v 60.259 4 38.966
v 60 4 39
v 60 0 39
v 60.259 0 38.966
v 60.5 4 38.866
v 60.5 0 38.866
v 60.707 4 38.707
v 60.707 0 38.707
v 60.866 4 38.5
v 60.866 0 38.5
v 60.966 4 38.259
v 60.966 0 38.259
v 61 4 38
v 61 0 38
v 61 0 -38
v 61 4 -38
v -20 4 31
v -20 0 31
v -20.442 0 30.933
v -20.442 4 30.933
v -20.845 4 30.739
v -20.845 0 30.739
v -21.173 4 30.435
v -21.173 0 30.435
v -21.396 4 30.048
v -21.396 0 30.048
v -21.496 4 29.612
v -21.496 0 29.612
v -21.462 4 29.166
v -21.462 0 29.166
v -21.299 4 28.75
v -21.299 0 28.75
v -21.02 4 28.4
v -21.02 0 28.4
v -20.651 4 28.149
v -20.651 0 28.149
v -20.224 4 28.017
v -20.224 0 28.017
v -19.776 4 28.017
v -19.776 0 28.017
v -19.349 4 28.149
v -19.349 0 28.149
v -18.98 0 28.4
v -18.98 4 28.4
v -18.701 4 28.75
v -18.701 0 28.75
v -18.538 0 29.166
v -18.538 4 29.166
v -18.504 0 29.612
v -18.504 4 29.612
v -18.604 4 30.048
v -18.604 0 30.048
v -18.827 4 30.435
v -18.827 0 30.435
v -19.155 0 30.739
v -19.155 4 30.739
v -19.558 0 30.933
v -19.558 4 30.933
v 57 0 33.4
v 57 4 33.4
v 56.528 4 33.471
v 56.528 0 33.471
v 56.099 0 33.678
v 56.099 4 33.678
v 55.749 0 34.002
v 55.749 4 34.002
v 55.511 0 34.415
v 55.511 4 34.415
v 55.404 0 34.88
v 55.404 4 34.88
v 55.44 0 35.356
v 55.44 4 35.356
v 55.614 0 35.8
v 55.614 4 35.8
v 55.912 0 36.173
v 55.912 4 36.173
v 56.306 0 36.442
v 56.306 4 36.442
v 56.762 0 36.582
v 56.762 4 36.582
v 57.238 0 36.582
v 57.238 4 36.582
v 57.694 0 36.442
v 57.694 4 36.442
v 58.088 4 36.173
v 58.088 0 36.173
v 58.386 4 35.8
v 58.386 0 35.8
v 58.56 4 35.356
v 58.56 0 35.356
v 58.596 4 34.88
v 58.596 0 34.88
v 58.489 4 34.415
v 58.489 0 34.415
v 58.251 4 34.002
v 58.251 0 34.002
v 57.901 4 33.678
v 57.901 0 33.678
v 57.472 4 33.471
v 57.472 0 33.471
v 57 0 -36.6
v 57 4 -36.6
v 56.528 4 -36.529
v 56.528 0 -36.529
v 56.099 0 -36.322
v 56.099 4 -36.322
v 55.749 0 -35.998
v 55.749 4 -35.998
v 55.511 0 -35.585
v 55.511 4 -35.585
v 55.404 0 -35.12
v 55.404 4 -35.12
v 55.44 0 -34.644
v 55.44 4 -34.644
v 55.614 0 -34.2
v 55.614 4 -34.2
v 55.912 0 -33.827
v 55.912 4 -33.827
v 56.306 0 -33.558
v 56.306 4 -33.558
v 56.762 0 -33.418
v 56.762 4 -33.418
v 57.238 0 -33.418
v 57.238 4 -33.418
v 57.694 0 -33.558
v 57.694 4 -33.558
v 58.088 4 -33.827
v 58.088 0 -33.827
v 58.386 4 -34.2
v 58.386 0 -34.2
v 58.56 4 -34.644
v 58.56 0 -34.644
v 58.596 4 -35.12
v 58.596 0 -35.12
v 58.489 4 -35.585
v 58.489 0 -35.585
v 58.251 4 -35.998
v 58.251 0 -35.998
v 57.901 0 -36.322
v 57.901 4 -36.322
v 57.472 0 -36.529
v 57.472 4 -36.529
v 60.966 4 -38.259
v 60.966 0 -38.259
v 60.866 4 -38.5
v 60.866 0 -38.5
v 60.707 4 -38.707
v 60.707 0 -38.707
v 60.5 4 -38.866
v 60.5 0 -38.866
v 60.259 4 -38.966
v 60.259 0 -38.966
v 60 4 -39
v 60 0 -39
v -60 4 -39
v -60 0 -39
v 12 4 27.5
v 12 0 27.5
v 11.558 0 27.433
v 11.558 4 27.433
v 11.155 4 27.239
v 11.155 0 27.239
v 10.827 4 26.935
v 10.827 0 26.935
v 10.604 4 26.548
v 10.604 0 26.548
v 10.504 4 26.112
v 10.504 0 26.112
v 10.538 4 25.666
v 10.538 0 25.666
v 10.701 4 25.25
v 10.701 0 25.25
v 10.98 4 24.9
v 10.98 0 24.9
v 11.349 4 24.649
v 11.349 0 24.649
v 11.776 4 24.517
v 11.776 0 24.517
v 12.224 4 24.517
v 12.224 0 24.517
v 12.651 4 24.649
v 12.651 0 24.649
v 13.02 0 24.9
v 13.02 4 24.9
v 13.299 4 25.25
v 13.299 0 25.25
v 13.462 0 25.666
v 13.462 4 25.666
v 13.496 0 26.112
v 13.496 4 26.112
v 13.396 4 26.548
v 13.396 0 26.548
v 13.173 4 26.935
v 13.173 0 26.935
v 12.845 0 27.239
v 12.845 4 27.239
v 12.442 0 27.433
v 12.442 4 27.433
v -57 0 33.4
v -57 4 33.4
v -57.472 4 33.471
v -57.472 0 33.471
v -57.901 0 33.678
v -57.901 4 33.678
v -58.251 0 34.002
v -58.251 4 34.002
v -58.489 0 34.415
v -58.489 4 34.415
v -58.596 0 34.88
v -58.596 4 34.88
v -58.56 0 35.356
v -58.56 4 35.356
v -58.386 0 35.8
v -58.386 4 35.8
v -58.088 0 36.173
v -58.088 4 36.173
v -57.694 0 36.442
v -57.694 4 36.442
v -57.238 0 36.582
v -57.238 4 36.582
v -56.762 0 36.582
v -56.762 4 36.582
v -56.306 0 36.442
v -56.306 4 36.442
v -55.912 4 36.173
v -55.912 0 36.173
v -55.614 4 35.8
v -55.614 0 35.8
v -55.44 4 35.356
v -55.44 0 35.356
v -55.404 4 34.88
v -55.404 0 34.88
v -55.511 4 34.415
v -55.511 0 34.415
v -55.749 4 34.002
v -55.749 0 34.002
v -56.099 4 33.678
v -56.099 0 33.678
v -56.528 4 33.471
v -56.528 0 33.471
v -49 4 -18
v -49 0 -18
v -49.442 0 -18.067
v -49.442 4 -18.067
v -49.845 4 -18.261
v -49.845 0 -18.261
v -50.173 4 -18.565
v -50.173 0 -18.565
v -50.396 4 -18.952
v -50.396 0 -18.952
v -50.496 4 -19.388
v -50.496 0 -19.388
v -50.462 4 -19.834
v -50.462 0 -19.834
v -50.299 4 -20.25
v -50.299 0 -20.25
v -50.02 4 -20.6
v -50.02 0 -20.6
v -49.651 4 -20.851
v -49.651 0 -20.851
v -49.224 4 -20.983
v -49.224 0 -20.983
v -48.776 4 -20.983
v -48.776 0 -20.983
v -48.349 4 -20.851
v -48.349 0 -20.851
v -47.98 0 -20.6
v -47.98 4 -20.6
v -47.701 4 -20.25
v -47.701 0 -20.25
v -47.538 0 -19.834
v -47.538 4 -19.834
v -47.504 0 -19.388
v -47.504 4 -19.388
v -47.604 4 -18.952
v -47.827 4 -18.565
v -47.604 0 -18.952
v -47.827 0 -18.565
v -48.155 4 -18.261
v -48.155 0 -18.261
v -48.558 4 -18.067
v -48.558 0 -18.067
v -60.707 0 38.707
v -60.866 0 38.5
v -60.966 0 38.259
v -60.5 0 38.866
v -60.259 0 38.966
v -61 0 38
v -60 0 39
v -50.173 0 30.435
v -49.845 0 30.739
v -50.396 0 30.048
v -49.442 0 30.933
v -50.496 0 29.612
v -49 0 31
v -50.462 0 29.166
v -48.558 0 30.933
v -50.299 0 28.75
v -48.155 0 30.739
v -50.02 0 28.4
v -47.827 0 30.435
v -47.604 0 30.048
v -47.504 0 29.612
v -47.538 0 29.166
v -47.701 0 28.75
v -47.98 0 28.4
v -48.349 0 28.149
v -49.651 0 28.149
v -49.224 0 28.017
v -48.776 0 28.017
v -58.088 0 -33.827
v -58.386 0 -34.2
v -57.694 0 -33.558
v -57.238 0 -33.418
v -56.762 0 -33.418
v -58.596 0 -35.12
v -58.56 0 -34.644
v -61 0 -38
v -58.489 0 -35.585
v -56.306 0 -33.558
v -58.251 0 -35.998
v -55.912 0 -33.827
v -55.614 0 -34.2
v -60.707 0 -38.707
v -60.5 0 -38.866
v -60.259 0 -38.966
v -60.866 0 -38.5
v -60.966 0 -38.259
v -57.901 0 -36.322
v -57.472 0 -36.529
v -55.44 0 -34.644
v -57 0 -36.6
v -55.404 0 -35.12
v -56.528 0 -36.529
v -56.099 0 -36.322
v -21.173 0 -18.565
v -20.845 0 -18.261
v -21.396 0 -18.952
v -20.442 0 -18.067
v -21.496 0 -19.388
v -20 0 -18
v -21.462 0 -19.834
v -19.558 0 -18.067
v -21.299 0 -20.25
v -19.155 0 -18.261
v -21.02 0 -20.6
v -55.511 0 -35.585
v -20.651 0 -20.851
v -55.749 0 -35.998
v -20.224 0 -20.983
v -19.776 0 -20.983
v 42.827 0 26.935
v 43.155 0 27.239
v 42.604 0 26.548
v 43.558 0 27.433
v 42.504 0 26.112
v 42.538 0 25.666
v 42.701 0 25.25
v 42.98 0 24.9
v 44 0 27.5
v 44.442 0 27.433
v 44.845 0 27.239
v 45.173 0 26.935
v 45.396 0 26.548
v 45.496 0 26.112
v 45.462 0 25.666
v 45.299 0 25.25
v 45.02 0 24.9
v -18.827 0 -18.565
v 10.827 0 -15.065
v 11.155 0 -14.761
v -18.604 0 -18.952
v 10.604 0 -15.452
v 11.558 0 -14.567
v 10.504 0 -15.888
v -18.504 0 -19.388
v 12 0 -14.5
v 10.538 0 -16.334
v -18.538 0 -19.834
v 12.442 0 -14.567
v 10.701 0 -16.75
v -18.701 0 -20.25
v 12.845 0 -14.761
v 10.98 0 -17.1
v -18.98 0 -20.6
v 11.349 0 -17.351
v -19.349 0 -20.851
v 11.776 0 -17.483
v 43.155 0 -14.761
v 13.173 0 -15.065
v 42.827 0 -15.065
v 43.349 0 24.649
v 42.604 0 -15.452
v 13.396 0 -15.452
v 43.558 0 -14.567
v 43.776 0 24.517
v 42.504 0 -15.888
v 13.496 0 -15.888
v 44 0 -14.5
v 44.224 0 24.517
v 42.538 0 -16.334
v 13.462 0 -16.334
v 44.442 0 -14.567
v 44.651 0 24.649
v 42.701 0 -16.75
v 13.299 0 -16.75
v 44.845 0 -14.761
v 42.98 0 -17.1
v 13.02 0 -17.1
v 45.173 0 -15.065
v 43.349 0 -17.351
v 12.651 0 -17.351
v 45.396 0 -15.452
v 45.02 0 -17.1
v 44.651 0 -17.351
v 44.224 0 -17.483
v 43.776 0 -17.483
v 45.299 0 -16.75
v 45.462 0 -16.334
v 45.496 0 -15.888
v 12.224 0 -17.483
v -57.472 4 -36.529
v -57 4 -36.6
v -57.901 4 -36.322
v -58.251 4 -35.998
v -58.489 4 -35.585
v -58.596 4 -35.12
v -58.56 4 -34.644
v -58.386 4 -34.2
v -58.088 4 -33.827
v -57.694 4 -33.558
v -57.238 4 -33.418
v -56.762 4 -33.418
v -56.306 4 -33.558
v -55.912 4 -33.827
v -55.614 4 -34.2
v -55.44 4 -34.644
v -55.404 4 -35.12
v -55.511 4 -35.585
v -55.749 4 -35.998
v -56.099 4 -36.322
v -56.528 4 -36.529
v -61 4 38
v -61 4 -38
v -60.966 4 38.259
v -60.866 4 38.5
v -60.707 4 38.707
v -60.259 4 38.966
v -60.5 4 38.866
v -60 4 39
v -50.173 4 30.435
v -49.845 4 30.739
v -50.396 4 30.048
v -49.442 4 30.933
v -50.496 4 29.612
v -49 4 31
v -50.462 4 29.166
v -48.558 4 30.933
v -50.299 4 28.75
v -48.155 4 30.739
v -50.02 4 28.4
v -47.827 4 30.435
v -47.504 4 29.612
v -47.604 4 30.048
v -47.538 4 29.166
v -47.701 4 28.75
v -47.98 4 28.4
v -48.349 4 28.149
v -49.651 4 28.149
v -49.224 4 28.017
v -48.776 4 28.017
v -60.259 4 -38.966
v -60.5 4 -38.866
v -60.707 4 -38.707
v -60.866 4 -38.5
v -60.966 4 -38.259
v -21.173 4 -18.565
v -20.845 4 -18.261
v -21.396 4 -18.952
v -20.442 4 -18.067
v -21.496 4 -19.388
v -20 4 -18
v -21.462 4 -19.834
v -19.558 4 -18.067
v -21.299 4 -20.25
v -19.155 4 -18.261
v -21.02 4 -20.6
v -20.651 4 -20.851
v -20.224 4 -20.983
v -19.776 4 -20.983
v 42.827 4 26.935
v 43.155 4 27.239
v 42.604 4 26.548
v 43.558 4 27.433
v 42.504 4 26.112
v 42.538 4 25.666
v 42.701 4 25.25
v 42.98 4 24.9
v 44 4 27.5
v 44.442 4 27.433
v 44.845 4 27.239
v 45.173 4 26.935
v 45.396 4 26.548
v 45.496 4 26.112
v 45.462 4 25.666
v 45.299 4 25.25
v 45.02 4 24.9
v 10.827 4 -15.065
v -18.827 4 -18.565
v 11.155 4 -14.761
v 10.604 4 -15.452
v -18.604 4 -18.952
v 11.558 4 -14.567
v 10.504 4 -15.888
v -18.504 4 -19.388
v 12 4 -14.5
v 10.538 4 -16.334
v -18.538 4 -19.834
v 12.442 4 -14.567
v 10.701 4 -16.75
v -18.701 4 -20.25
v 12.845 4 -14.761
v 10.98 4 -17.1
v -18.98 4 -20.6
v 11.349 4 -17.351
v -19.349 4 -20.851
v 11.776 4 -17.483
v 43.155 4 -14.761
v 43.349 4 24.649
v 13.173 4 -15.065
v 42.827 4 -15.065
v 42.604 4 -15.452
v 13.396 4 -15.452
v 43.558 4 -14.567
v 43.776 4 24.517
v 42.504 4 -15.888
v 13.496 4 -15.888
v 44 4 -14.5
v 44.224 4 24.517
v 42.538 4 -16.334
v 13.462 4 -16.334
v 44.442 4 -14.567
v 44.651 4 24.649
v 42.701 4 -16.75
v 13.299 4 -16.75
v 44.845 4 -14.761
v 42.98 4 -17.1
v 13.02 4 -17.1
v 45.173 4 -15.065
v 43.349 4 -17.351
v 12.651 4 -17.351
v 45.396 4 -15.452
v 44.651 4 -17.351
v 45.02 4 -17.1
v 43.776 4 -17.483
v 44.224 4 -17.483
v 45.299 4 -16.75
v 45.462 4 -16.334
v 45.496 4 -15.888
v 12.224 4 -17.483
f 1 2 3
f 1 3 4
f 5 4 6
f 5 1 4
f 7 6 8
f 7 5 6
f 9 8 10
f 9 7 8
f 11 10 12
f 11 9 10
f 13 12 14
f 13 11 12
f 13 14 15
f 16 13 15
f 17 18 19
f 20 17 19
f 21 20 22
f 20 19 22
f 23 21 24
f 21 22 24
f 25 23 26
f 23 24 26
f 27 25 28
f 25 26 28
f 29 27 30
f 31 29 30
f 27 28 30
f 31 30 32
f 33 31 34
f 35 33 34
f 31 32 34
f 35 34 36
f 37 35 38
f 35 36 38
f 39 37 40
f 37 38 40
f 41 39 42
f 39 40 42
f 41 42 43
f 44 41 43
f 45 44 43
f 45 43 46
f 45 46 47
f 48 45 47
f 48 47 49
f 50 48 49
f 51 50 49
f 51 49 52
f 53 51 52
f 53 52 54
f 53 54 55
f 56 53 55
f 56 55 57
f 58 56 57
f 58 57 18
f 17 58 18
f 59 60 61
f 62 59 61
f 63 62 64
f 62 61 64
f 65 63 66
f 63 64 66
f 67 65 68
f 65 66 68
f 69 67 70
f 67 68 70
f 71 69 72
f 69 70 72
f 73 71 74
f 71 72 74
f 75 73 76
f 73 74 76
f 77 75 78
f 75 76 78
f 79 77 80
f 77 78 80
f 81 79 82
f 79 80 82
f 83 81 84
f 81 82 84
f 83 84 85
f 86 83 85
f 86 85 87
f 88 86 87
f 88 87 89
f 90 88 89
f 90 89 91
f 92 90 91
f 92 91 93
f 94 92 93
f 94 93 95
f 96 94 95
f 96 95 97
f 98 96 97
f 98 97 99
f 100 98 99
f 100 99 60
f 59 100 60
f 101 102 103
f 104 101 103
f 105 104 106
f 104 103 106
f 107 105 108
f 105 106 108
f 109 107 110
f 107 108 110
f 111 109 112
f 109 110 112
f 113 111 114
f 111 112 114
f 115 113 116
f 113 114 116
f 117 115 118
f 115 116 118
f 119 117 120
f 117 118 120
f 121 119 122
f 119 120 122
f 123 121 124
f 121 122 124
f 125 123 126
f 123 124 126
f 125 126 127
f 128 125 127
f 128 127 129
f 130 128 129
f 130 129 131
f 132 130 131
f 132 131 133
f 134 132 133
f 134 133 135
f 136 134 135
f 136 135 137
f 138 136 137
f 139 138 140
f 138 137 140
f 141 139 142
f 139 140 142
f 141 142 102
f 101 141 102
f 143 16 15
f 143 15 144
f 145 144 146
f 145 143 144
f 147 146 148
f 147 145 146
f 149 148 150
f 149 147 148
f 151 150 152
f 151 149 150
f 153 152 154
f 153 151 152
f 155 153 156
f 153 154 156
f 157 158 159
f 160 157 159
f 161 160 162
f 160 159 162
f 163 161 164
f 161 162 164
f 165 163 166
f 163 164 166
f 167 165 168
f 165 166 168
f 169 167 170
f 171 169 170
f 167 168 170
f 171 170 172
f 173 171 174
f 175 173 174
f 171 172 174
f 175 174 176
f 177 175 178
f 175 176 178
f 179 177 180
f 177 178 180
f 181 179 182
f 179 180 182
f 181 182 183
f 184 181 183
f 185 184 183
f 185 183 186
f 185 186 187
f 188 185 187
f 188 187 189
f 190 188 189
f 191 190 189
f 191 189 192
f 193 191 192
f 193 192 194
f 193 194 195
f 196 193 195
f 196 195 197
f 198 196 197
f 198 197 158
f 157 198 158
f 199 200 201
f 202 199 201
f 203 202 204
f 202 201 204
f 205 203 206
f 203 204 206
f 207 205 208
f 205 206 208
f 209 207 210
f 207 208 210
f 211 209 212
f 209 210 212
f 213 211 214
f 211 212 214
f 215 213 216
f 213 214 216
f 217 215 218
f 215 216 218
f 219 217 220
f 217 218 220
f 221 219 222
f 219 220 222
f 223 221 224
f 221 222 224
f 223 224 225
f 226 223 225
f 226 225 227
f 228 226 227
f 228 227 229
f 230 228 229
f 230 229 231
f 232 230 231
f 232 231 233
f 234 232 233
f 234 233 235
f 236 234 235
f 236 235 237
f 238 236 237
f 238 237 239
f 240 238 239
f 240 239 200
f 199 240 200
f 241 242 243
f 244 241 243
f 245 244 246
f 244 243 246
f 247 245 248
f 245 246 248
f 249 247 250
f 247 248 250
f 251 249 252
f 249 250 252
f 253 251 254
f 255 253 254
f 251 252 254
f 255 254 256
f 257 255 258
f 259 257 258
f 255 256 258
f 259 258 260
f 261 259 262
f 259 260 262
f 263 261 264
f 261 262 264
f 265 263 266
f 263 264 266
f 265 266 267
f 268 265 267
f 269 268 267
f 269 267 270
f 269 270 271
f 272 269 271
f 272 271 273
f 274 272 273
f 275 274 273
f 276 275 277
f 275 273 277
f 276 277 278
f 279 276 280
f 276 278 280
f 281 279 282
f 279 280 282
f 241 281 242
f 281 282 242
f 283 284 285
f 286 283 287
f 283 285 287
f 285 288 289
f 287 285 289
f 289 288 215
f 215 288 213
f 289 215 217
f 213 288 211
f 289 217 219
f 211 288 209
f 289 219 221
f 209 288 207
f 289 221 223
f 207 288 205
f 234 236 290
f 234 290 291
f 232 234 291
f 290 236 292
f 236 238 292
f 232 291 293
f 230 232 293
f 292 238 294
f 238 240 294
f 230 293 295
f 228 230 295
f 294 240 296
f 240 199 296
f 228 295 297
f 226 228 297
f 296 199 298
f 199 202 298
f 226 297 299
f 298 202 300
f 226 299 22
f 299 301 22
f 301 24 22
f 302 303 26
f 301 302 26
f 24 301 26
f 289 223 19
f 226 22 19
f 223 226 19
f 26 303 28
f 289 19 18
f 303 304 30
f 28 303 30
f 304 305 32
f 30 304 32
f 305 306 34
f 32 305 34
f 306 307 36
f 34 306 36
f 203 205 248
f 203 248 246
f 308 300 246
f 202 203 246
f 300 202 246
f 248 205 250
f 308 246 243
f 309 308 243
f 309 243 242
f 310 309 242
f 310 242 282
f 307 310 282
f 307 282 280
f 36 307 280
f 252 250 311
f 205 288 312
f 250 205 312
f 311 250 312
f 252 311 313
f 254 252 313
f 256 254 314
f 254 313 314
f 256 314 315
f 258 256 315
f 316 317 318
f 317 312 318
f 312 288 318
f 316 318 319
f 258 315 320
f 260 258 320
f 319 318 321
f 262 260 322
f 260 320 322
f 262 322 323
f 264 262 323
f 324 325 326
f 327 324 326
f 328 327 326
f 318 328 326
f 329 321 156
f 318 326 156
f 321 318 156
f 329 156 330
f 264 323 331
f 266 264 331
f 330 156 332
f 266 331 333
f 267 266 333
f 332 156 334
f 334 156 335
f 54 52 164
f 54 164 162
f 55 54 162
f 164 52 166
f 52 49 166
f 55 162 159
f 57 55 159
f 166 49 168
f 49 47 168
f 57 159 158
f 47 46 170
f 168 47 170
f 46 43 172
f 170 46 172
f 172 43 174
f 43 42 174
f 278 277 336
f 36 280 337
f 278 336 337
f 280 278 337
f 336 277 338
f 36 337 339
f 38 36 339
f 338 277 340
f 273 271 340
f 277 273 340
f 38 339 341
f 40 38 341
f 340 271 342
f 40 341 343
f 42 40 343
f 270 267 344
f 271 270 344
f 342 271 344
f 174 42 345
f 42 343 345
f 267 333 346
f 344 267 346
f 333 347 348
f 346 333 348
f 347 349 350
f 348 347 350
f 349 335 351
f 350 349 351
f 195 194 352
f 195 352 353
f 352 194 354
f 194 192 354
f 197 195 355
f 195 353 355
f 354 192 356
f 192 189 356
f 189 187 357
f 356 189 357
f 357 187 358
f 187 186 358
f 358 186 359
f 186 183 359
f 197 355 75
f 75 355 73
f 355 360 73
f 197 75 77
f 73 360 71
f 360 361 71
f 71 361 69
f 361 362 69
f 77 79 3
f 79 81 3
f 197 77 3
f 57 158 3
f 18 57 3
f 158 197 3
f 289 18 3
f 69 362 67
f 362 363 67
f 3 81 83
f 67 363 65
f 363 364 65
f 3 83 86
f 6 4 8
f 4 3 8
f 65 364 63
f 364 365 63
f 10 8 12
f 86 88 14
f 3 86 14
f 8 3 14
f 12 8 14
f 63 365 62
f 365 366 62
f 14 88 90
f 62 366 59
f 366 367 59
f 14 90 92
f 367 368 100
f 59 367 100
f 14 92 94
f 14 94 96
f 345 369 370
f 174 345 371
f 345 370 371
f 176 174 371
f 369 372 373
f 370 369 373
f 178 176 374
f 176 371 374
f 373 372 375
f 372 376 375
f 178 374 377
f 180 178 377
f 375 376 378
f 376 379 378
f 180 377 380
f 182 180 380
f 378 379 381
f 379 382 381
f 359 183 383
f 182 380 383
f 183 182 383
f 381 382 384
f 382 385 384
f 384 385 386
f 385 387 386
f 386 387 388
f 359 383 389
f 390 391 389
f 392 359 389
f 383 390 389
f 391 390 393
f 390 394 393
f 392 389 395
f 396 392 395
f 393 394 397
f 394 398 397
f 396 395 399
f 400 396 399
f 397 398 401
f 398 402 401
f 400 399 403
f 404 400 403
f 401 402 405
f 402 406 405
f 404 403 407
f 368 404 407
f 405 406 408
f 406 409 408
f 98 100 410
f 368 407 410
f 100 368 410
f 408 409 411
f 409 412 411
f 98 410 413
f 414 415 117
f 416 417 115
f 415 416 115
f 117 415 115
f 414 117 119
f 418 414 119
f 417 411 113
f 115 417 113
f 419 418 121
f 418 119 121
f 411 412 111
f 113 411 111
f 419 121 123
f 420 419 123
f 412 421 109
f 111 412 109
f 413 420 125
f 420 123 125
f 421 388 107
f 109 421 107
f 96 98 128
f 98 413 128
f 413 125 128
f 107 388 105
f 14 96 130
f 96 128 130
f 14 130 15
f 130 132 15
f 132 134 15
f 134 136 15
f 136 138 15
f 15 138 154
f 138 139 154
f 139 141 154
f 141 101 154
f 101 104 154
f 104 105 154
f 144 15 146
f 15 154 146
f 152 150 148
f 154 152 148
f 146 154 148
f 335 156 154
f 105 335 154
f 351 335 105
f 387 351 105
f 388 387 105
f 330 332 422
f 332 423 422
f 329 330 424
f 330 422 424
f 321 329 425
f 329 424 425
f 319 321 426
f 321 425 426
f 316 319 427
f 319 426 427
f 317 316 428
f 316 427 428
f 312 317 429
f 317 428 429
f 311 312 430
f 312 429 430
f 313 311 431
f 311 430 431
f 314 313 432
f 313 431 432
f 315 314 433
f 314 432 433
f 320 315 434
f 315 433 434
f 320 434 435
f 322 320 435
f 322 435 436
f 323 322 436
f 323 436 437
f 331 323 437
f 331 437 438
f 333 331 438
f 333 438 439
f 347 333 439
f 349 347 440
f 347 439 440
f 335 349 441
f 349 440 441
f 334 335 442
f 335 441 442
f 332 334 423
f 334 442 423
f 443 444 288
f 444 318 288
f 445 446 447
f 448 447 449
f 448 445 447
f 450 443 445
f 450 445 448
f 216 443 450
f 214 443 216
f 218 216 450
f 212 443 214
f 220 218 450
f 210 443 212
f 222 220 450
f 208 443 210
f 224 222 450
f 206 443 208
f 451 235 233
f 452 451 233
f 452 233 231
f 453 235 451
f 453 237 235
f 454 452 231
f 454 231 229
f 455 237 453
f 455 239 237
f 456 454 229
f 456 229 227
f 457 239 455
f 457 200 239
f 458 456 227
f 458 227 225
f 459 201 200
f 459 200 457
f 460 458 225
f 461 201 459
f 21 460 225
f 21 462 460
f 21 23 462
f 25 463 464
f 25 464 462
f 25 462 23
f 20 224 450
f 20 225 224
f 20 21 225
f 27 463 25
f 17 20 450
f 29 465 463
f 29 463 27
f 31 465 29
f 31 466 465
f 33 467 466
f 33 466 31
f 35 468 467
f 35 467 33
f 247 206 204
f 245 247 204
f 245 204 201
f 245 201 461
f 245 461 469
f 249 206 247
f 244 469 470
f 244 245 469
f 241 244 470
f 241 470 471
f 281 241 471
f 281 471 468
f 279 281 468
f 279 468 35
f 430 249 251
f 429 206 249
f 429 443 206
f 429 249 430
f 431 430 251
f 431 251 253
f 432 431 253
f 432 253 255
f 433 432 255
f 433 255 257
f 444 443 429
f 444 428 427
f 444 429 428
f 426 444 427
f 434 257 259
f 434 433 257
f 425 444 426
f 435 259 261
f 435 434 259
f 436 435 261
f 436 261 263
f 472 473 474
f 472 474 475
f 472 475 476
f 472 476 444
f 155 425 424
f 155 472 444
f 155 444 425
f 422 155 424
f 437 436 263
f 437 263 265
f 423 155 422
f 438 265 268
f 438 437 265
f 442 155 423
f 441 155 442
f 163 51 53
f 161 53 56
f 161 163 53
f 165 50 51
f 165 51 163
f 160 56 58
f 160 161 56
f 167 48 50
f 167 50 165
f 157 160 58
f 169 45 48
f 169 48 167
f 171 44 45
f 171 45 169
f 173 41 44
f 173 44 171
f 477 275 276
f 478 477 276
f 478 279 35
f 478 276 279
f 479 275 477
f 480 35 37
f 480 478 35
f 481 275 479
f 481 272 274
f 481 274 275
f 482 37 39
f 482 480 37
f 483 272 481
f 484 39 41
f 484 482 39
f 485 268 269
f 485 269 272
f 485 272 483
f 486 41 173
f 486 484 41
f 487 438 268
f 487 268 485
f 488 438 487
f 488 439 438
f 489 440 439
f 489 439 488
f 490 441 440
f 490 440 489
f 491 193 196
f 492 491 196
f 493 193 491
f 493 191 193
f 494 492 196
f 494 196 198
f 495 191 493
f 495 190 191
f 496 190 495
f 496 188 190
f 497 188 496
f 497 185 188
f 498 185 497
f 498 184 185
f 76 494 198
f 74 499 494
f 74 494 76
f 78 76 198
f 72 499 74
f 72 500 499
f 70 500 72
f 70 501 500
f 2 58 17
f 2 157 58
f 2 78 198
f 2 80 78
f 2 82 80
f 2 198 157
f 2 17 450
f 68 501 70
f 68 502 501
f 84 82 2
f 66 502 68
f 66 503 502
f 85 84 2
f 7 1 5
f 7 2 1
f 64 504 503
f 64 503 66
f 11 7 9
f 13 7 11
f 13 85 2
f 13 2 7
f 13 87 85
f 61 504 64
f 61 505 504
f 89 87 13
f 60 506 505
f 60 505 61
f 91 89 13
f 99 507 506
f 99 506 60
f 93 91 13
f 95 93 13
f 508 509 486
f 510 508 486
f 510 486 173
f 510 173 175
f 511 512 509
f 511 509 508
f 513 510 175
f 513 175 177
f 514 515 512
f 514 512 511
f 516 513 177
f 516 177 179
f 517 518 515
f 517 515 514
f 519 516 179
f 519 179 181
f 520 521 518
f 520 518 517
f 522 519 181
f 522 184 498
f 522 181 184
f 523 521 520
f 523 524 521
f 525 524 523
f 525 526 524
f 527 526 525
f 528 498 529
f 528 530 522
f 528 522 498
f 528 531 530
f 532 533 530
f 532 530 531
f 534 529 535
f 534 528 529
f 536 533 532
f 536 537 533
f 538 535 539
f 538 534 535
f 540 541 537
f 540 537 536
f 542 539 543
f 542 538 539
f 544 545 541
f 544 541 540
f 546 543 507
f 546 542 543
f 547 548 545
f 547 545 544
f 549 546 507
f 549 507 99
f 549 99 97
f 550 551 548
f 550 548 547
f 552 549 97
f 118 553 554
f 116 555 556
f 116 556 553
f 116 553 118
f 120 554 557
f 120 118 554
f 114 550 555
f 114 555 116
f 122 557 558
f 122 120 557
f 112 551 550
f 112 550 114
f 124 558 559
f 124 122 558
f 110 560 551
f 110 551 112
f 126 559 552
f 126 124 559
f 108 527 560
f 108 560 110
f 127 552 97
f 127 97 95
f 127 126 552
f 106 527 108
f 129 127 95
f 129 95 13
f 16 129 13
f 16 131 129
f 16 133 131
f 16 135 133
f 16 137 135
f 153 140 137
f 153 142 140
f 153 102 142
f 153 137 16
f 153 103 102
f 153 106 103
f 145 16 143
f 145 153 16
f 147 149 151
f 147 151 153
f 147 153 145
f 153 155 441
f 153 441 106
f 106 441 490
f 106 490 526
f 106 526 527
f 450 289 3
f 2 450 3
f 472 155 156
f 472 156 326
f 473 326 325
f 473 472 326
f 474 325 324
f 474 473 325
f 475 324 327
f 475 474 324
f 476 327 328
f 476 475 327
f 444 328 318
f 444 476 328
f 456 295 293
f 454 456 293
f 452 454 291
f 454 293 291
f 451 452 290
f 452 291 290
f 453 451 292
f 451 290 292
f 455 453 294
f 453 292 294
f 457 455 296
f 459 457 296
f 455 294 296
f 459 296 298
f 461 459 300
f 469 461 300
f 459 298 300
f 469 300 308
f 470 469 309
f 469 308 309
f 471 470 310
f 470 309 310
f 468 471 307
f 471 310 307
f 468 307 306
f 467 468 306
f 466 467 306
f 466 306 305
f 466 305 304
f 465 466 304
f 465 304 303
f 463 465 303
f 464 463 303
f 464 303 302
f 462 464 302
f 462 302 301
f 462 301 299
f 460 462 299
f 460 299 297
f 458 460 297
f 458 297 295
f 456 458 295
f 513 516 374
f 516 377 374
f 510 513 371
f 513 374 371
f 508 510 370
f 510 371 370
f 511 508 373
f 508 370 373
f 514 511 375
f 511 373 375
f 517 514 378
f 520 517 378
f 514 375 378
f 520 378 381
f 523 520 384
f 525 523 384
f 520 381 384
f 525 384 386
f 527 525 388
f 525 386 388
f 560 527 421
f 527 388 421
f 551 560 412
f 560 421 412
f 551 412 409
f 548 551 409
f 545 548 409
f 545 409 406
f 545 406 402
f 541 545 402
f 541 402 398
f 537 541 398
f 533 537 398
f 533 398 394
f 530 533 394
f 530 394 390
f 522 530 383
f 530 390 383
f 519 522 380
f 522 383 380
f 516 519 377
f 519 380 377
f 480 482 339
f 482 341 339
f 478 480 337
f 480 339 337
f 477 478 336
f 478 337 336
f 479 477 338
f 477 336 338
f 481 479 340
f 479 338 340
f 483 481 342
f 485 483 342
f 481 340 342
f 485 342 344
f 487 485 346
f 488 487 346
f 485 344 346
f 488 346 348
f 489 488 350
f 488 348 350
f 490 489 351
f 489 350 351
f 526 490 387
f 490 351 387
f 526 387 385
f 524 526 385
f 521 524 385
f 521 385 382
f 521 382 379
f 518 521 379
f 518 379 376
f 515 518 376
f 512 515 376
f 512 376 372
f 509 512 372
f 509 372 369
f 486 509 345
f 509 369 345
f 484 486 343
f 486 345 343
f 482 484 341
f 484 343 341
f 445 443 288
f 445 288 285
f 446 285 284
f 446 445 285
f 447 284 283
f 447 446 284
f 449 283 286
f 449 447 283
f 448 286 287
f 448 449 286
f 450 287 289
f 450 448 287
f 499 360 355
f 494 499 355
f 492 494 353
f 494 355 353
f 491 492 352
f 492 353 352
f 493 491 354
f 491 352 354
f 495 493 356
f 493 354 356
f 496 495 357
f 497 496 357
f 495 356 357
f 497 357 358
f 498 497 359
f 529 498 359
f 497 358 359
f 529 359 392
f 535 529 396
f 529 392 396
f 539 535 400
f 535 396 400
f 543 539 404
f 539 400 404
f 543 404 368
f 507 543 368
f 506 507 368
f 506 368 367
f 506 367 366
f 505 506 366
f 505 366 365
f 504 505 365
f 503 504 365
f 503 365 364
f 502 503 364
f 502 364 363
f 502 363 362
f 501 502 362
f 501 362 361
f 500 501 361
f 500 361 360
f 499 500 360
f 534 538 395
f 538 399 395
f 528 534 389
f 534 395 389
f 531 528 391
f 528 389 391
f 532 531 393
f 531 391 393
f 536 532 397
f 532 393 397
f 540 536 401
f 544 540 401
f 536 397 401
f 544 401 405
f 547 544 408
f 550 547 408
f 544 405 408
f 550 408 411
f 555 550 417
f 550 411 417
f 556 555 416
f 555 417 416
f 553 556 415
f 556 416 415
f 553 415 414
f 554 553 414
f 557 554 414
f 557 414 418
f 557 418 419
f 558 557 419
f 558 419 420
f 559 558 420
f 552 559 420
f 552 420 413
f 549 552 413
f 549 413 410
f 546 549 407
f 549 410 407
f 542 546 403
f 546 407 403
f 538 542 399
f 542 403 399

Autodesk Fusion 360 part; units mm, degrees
sketch "スケッチ1" plane through (0, 0, 0) normal (0, 1, 0) x (1, 0, 0)
  line L0 (57, 35) -> (-57, 35)
  line L1 (-57, 35) -> (-57, -35)
  line L2 (-57, -35) -> (57, -35)
  line L3 (57, -35) -> (57, 35)
  line L4 (57, 35) -> (-57, -35) construction
  line L5 (-57, 35) -> (57, -35) construction
  line L6 (61, 39) -> (-61, 39)
  line L7 (-61, 39) -> (-61, -39)
  line L8 (-61, -39) -> (61, -39)
  line L9 (61, -39) -> (61, 39)
  line L10 (61, 39) -> (-61, -39) construction
  line L11 (-61, 39) -> (61, -39) construction
  dimension "d9" = 114
  dimension "d10" = 70
  dimension "d11" = 78
  dimension "d12" = 122
extrude "押し出し1" add sketch "スケッチ1" along normal blind 4 contours L0 L1 L2 L3 | L6 L7 L8 L9
hole "穴1" at (-57, 0, -35) at (-57, 0, 35) at (57, 0, 35) at (57, 0, -35) direction (0, 1, 0) diameter 3.2 end through all
sketch "スケッチ2" plane through (0, 4, 0) normal (0, 1, 0) x (-1, 0, 0)
  circle A0 centre (-57, 35) radius 1.6
  circle A1 centre (57, -35) radius 1.6
  circle A2 centre (57, 35) radius 1.6
  circle A3 centre (-57, -35) radius 1.6
  line L0 (-61, 39) -> (-61, -39)
  line L1 (-61, -39) -> (61, -39)
  line L2 (61, -39) -> (61, 39)
  line L3 (61, 39) -> (-61, 39)
  line L4 (49, -19.5) -> (20, -19.5)
  line L5 (20, -19.5) -> (20, 29.5)
  line L6 (20, 29.5) -> (49, 29.5)
  line L7 (49, 29.5) -> (49, -19.5)
  line L8 (-12, -16) -> (-12, 26)
  line L9 (-44, -16) -> (-44, 26)
  point P0 (-12, 5)
  point P1 (-44, 5)
  point P2 (20, 5)
  dimension "d13" = 29
  dimension "d14" = 49
  dimension "d15" = 12
  dimension "d16" = 42
  dimension "d17" = 42
  dimension "d18" = 32
  dimension "d19" = 17
  dimension "d25" = 5
hole "穴2" at (-49, 4, -19.5) at (-49, 4, 29.5) at (-20, 4, 29.5) at (-20, 4, -19.5) at (44, 4, -16) at (44, 4, 26) at (12, 4, -16) at (12, 4, 26) direction (0, -1, 0) diameter 3 end through all
fillet "フィレット1" radius 1 4 edges at (61, 2, 39) (61, 2, -39) (-61, 2, 39) (-61, 2, -39)
